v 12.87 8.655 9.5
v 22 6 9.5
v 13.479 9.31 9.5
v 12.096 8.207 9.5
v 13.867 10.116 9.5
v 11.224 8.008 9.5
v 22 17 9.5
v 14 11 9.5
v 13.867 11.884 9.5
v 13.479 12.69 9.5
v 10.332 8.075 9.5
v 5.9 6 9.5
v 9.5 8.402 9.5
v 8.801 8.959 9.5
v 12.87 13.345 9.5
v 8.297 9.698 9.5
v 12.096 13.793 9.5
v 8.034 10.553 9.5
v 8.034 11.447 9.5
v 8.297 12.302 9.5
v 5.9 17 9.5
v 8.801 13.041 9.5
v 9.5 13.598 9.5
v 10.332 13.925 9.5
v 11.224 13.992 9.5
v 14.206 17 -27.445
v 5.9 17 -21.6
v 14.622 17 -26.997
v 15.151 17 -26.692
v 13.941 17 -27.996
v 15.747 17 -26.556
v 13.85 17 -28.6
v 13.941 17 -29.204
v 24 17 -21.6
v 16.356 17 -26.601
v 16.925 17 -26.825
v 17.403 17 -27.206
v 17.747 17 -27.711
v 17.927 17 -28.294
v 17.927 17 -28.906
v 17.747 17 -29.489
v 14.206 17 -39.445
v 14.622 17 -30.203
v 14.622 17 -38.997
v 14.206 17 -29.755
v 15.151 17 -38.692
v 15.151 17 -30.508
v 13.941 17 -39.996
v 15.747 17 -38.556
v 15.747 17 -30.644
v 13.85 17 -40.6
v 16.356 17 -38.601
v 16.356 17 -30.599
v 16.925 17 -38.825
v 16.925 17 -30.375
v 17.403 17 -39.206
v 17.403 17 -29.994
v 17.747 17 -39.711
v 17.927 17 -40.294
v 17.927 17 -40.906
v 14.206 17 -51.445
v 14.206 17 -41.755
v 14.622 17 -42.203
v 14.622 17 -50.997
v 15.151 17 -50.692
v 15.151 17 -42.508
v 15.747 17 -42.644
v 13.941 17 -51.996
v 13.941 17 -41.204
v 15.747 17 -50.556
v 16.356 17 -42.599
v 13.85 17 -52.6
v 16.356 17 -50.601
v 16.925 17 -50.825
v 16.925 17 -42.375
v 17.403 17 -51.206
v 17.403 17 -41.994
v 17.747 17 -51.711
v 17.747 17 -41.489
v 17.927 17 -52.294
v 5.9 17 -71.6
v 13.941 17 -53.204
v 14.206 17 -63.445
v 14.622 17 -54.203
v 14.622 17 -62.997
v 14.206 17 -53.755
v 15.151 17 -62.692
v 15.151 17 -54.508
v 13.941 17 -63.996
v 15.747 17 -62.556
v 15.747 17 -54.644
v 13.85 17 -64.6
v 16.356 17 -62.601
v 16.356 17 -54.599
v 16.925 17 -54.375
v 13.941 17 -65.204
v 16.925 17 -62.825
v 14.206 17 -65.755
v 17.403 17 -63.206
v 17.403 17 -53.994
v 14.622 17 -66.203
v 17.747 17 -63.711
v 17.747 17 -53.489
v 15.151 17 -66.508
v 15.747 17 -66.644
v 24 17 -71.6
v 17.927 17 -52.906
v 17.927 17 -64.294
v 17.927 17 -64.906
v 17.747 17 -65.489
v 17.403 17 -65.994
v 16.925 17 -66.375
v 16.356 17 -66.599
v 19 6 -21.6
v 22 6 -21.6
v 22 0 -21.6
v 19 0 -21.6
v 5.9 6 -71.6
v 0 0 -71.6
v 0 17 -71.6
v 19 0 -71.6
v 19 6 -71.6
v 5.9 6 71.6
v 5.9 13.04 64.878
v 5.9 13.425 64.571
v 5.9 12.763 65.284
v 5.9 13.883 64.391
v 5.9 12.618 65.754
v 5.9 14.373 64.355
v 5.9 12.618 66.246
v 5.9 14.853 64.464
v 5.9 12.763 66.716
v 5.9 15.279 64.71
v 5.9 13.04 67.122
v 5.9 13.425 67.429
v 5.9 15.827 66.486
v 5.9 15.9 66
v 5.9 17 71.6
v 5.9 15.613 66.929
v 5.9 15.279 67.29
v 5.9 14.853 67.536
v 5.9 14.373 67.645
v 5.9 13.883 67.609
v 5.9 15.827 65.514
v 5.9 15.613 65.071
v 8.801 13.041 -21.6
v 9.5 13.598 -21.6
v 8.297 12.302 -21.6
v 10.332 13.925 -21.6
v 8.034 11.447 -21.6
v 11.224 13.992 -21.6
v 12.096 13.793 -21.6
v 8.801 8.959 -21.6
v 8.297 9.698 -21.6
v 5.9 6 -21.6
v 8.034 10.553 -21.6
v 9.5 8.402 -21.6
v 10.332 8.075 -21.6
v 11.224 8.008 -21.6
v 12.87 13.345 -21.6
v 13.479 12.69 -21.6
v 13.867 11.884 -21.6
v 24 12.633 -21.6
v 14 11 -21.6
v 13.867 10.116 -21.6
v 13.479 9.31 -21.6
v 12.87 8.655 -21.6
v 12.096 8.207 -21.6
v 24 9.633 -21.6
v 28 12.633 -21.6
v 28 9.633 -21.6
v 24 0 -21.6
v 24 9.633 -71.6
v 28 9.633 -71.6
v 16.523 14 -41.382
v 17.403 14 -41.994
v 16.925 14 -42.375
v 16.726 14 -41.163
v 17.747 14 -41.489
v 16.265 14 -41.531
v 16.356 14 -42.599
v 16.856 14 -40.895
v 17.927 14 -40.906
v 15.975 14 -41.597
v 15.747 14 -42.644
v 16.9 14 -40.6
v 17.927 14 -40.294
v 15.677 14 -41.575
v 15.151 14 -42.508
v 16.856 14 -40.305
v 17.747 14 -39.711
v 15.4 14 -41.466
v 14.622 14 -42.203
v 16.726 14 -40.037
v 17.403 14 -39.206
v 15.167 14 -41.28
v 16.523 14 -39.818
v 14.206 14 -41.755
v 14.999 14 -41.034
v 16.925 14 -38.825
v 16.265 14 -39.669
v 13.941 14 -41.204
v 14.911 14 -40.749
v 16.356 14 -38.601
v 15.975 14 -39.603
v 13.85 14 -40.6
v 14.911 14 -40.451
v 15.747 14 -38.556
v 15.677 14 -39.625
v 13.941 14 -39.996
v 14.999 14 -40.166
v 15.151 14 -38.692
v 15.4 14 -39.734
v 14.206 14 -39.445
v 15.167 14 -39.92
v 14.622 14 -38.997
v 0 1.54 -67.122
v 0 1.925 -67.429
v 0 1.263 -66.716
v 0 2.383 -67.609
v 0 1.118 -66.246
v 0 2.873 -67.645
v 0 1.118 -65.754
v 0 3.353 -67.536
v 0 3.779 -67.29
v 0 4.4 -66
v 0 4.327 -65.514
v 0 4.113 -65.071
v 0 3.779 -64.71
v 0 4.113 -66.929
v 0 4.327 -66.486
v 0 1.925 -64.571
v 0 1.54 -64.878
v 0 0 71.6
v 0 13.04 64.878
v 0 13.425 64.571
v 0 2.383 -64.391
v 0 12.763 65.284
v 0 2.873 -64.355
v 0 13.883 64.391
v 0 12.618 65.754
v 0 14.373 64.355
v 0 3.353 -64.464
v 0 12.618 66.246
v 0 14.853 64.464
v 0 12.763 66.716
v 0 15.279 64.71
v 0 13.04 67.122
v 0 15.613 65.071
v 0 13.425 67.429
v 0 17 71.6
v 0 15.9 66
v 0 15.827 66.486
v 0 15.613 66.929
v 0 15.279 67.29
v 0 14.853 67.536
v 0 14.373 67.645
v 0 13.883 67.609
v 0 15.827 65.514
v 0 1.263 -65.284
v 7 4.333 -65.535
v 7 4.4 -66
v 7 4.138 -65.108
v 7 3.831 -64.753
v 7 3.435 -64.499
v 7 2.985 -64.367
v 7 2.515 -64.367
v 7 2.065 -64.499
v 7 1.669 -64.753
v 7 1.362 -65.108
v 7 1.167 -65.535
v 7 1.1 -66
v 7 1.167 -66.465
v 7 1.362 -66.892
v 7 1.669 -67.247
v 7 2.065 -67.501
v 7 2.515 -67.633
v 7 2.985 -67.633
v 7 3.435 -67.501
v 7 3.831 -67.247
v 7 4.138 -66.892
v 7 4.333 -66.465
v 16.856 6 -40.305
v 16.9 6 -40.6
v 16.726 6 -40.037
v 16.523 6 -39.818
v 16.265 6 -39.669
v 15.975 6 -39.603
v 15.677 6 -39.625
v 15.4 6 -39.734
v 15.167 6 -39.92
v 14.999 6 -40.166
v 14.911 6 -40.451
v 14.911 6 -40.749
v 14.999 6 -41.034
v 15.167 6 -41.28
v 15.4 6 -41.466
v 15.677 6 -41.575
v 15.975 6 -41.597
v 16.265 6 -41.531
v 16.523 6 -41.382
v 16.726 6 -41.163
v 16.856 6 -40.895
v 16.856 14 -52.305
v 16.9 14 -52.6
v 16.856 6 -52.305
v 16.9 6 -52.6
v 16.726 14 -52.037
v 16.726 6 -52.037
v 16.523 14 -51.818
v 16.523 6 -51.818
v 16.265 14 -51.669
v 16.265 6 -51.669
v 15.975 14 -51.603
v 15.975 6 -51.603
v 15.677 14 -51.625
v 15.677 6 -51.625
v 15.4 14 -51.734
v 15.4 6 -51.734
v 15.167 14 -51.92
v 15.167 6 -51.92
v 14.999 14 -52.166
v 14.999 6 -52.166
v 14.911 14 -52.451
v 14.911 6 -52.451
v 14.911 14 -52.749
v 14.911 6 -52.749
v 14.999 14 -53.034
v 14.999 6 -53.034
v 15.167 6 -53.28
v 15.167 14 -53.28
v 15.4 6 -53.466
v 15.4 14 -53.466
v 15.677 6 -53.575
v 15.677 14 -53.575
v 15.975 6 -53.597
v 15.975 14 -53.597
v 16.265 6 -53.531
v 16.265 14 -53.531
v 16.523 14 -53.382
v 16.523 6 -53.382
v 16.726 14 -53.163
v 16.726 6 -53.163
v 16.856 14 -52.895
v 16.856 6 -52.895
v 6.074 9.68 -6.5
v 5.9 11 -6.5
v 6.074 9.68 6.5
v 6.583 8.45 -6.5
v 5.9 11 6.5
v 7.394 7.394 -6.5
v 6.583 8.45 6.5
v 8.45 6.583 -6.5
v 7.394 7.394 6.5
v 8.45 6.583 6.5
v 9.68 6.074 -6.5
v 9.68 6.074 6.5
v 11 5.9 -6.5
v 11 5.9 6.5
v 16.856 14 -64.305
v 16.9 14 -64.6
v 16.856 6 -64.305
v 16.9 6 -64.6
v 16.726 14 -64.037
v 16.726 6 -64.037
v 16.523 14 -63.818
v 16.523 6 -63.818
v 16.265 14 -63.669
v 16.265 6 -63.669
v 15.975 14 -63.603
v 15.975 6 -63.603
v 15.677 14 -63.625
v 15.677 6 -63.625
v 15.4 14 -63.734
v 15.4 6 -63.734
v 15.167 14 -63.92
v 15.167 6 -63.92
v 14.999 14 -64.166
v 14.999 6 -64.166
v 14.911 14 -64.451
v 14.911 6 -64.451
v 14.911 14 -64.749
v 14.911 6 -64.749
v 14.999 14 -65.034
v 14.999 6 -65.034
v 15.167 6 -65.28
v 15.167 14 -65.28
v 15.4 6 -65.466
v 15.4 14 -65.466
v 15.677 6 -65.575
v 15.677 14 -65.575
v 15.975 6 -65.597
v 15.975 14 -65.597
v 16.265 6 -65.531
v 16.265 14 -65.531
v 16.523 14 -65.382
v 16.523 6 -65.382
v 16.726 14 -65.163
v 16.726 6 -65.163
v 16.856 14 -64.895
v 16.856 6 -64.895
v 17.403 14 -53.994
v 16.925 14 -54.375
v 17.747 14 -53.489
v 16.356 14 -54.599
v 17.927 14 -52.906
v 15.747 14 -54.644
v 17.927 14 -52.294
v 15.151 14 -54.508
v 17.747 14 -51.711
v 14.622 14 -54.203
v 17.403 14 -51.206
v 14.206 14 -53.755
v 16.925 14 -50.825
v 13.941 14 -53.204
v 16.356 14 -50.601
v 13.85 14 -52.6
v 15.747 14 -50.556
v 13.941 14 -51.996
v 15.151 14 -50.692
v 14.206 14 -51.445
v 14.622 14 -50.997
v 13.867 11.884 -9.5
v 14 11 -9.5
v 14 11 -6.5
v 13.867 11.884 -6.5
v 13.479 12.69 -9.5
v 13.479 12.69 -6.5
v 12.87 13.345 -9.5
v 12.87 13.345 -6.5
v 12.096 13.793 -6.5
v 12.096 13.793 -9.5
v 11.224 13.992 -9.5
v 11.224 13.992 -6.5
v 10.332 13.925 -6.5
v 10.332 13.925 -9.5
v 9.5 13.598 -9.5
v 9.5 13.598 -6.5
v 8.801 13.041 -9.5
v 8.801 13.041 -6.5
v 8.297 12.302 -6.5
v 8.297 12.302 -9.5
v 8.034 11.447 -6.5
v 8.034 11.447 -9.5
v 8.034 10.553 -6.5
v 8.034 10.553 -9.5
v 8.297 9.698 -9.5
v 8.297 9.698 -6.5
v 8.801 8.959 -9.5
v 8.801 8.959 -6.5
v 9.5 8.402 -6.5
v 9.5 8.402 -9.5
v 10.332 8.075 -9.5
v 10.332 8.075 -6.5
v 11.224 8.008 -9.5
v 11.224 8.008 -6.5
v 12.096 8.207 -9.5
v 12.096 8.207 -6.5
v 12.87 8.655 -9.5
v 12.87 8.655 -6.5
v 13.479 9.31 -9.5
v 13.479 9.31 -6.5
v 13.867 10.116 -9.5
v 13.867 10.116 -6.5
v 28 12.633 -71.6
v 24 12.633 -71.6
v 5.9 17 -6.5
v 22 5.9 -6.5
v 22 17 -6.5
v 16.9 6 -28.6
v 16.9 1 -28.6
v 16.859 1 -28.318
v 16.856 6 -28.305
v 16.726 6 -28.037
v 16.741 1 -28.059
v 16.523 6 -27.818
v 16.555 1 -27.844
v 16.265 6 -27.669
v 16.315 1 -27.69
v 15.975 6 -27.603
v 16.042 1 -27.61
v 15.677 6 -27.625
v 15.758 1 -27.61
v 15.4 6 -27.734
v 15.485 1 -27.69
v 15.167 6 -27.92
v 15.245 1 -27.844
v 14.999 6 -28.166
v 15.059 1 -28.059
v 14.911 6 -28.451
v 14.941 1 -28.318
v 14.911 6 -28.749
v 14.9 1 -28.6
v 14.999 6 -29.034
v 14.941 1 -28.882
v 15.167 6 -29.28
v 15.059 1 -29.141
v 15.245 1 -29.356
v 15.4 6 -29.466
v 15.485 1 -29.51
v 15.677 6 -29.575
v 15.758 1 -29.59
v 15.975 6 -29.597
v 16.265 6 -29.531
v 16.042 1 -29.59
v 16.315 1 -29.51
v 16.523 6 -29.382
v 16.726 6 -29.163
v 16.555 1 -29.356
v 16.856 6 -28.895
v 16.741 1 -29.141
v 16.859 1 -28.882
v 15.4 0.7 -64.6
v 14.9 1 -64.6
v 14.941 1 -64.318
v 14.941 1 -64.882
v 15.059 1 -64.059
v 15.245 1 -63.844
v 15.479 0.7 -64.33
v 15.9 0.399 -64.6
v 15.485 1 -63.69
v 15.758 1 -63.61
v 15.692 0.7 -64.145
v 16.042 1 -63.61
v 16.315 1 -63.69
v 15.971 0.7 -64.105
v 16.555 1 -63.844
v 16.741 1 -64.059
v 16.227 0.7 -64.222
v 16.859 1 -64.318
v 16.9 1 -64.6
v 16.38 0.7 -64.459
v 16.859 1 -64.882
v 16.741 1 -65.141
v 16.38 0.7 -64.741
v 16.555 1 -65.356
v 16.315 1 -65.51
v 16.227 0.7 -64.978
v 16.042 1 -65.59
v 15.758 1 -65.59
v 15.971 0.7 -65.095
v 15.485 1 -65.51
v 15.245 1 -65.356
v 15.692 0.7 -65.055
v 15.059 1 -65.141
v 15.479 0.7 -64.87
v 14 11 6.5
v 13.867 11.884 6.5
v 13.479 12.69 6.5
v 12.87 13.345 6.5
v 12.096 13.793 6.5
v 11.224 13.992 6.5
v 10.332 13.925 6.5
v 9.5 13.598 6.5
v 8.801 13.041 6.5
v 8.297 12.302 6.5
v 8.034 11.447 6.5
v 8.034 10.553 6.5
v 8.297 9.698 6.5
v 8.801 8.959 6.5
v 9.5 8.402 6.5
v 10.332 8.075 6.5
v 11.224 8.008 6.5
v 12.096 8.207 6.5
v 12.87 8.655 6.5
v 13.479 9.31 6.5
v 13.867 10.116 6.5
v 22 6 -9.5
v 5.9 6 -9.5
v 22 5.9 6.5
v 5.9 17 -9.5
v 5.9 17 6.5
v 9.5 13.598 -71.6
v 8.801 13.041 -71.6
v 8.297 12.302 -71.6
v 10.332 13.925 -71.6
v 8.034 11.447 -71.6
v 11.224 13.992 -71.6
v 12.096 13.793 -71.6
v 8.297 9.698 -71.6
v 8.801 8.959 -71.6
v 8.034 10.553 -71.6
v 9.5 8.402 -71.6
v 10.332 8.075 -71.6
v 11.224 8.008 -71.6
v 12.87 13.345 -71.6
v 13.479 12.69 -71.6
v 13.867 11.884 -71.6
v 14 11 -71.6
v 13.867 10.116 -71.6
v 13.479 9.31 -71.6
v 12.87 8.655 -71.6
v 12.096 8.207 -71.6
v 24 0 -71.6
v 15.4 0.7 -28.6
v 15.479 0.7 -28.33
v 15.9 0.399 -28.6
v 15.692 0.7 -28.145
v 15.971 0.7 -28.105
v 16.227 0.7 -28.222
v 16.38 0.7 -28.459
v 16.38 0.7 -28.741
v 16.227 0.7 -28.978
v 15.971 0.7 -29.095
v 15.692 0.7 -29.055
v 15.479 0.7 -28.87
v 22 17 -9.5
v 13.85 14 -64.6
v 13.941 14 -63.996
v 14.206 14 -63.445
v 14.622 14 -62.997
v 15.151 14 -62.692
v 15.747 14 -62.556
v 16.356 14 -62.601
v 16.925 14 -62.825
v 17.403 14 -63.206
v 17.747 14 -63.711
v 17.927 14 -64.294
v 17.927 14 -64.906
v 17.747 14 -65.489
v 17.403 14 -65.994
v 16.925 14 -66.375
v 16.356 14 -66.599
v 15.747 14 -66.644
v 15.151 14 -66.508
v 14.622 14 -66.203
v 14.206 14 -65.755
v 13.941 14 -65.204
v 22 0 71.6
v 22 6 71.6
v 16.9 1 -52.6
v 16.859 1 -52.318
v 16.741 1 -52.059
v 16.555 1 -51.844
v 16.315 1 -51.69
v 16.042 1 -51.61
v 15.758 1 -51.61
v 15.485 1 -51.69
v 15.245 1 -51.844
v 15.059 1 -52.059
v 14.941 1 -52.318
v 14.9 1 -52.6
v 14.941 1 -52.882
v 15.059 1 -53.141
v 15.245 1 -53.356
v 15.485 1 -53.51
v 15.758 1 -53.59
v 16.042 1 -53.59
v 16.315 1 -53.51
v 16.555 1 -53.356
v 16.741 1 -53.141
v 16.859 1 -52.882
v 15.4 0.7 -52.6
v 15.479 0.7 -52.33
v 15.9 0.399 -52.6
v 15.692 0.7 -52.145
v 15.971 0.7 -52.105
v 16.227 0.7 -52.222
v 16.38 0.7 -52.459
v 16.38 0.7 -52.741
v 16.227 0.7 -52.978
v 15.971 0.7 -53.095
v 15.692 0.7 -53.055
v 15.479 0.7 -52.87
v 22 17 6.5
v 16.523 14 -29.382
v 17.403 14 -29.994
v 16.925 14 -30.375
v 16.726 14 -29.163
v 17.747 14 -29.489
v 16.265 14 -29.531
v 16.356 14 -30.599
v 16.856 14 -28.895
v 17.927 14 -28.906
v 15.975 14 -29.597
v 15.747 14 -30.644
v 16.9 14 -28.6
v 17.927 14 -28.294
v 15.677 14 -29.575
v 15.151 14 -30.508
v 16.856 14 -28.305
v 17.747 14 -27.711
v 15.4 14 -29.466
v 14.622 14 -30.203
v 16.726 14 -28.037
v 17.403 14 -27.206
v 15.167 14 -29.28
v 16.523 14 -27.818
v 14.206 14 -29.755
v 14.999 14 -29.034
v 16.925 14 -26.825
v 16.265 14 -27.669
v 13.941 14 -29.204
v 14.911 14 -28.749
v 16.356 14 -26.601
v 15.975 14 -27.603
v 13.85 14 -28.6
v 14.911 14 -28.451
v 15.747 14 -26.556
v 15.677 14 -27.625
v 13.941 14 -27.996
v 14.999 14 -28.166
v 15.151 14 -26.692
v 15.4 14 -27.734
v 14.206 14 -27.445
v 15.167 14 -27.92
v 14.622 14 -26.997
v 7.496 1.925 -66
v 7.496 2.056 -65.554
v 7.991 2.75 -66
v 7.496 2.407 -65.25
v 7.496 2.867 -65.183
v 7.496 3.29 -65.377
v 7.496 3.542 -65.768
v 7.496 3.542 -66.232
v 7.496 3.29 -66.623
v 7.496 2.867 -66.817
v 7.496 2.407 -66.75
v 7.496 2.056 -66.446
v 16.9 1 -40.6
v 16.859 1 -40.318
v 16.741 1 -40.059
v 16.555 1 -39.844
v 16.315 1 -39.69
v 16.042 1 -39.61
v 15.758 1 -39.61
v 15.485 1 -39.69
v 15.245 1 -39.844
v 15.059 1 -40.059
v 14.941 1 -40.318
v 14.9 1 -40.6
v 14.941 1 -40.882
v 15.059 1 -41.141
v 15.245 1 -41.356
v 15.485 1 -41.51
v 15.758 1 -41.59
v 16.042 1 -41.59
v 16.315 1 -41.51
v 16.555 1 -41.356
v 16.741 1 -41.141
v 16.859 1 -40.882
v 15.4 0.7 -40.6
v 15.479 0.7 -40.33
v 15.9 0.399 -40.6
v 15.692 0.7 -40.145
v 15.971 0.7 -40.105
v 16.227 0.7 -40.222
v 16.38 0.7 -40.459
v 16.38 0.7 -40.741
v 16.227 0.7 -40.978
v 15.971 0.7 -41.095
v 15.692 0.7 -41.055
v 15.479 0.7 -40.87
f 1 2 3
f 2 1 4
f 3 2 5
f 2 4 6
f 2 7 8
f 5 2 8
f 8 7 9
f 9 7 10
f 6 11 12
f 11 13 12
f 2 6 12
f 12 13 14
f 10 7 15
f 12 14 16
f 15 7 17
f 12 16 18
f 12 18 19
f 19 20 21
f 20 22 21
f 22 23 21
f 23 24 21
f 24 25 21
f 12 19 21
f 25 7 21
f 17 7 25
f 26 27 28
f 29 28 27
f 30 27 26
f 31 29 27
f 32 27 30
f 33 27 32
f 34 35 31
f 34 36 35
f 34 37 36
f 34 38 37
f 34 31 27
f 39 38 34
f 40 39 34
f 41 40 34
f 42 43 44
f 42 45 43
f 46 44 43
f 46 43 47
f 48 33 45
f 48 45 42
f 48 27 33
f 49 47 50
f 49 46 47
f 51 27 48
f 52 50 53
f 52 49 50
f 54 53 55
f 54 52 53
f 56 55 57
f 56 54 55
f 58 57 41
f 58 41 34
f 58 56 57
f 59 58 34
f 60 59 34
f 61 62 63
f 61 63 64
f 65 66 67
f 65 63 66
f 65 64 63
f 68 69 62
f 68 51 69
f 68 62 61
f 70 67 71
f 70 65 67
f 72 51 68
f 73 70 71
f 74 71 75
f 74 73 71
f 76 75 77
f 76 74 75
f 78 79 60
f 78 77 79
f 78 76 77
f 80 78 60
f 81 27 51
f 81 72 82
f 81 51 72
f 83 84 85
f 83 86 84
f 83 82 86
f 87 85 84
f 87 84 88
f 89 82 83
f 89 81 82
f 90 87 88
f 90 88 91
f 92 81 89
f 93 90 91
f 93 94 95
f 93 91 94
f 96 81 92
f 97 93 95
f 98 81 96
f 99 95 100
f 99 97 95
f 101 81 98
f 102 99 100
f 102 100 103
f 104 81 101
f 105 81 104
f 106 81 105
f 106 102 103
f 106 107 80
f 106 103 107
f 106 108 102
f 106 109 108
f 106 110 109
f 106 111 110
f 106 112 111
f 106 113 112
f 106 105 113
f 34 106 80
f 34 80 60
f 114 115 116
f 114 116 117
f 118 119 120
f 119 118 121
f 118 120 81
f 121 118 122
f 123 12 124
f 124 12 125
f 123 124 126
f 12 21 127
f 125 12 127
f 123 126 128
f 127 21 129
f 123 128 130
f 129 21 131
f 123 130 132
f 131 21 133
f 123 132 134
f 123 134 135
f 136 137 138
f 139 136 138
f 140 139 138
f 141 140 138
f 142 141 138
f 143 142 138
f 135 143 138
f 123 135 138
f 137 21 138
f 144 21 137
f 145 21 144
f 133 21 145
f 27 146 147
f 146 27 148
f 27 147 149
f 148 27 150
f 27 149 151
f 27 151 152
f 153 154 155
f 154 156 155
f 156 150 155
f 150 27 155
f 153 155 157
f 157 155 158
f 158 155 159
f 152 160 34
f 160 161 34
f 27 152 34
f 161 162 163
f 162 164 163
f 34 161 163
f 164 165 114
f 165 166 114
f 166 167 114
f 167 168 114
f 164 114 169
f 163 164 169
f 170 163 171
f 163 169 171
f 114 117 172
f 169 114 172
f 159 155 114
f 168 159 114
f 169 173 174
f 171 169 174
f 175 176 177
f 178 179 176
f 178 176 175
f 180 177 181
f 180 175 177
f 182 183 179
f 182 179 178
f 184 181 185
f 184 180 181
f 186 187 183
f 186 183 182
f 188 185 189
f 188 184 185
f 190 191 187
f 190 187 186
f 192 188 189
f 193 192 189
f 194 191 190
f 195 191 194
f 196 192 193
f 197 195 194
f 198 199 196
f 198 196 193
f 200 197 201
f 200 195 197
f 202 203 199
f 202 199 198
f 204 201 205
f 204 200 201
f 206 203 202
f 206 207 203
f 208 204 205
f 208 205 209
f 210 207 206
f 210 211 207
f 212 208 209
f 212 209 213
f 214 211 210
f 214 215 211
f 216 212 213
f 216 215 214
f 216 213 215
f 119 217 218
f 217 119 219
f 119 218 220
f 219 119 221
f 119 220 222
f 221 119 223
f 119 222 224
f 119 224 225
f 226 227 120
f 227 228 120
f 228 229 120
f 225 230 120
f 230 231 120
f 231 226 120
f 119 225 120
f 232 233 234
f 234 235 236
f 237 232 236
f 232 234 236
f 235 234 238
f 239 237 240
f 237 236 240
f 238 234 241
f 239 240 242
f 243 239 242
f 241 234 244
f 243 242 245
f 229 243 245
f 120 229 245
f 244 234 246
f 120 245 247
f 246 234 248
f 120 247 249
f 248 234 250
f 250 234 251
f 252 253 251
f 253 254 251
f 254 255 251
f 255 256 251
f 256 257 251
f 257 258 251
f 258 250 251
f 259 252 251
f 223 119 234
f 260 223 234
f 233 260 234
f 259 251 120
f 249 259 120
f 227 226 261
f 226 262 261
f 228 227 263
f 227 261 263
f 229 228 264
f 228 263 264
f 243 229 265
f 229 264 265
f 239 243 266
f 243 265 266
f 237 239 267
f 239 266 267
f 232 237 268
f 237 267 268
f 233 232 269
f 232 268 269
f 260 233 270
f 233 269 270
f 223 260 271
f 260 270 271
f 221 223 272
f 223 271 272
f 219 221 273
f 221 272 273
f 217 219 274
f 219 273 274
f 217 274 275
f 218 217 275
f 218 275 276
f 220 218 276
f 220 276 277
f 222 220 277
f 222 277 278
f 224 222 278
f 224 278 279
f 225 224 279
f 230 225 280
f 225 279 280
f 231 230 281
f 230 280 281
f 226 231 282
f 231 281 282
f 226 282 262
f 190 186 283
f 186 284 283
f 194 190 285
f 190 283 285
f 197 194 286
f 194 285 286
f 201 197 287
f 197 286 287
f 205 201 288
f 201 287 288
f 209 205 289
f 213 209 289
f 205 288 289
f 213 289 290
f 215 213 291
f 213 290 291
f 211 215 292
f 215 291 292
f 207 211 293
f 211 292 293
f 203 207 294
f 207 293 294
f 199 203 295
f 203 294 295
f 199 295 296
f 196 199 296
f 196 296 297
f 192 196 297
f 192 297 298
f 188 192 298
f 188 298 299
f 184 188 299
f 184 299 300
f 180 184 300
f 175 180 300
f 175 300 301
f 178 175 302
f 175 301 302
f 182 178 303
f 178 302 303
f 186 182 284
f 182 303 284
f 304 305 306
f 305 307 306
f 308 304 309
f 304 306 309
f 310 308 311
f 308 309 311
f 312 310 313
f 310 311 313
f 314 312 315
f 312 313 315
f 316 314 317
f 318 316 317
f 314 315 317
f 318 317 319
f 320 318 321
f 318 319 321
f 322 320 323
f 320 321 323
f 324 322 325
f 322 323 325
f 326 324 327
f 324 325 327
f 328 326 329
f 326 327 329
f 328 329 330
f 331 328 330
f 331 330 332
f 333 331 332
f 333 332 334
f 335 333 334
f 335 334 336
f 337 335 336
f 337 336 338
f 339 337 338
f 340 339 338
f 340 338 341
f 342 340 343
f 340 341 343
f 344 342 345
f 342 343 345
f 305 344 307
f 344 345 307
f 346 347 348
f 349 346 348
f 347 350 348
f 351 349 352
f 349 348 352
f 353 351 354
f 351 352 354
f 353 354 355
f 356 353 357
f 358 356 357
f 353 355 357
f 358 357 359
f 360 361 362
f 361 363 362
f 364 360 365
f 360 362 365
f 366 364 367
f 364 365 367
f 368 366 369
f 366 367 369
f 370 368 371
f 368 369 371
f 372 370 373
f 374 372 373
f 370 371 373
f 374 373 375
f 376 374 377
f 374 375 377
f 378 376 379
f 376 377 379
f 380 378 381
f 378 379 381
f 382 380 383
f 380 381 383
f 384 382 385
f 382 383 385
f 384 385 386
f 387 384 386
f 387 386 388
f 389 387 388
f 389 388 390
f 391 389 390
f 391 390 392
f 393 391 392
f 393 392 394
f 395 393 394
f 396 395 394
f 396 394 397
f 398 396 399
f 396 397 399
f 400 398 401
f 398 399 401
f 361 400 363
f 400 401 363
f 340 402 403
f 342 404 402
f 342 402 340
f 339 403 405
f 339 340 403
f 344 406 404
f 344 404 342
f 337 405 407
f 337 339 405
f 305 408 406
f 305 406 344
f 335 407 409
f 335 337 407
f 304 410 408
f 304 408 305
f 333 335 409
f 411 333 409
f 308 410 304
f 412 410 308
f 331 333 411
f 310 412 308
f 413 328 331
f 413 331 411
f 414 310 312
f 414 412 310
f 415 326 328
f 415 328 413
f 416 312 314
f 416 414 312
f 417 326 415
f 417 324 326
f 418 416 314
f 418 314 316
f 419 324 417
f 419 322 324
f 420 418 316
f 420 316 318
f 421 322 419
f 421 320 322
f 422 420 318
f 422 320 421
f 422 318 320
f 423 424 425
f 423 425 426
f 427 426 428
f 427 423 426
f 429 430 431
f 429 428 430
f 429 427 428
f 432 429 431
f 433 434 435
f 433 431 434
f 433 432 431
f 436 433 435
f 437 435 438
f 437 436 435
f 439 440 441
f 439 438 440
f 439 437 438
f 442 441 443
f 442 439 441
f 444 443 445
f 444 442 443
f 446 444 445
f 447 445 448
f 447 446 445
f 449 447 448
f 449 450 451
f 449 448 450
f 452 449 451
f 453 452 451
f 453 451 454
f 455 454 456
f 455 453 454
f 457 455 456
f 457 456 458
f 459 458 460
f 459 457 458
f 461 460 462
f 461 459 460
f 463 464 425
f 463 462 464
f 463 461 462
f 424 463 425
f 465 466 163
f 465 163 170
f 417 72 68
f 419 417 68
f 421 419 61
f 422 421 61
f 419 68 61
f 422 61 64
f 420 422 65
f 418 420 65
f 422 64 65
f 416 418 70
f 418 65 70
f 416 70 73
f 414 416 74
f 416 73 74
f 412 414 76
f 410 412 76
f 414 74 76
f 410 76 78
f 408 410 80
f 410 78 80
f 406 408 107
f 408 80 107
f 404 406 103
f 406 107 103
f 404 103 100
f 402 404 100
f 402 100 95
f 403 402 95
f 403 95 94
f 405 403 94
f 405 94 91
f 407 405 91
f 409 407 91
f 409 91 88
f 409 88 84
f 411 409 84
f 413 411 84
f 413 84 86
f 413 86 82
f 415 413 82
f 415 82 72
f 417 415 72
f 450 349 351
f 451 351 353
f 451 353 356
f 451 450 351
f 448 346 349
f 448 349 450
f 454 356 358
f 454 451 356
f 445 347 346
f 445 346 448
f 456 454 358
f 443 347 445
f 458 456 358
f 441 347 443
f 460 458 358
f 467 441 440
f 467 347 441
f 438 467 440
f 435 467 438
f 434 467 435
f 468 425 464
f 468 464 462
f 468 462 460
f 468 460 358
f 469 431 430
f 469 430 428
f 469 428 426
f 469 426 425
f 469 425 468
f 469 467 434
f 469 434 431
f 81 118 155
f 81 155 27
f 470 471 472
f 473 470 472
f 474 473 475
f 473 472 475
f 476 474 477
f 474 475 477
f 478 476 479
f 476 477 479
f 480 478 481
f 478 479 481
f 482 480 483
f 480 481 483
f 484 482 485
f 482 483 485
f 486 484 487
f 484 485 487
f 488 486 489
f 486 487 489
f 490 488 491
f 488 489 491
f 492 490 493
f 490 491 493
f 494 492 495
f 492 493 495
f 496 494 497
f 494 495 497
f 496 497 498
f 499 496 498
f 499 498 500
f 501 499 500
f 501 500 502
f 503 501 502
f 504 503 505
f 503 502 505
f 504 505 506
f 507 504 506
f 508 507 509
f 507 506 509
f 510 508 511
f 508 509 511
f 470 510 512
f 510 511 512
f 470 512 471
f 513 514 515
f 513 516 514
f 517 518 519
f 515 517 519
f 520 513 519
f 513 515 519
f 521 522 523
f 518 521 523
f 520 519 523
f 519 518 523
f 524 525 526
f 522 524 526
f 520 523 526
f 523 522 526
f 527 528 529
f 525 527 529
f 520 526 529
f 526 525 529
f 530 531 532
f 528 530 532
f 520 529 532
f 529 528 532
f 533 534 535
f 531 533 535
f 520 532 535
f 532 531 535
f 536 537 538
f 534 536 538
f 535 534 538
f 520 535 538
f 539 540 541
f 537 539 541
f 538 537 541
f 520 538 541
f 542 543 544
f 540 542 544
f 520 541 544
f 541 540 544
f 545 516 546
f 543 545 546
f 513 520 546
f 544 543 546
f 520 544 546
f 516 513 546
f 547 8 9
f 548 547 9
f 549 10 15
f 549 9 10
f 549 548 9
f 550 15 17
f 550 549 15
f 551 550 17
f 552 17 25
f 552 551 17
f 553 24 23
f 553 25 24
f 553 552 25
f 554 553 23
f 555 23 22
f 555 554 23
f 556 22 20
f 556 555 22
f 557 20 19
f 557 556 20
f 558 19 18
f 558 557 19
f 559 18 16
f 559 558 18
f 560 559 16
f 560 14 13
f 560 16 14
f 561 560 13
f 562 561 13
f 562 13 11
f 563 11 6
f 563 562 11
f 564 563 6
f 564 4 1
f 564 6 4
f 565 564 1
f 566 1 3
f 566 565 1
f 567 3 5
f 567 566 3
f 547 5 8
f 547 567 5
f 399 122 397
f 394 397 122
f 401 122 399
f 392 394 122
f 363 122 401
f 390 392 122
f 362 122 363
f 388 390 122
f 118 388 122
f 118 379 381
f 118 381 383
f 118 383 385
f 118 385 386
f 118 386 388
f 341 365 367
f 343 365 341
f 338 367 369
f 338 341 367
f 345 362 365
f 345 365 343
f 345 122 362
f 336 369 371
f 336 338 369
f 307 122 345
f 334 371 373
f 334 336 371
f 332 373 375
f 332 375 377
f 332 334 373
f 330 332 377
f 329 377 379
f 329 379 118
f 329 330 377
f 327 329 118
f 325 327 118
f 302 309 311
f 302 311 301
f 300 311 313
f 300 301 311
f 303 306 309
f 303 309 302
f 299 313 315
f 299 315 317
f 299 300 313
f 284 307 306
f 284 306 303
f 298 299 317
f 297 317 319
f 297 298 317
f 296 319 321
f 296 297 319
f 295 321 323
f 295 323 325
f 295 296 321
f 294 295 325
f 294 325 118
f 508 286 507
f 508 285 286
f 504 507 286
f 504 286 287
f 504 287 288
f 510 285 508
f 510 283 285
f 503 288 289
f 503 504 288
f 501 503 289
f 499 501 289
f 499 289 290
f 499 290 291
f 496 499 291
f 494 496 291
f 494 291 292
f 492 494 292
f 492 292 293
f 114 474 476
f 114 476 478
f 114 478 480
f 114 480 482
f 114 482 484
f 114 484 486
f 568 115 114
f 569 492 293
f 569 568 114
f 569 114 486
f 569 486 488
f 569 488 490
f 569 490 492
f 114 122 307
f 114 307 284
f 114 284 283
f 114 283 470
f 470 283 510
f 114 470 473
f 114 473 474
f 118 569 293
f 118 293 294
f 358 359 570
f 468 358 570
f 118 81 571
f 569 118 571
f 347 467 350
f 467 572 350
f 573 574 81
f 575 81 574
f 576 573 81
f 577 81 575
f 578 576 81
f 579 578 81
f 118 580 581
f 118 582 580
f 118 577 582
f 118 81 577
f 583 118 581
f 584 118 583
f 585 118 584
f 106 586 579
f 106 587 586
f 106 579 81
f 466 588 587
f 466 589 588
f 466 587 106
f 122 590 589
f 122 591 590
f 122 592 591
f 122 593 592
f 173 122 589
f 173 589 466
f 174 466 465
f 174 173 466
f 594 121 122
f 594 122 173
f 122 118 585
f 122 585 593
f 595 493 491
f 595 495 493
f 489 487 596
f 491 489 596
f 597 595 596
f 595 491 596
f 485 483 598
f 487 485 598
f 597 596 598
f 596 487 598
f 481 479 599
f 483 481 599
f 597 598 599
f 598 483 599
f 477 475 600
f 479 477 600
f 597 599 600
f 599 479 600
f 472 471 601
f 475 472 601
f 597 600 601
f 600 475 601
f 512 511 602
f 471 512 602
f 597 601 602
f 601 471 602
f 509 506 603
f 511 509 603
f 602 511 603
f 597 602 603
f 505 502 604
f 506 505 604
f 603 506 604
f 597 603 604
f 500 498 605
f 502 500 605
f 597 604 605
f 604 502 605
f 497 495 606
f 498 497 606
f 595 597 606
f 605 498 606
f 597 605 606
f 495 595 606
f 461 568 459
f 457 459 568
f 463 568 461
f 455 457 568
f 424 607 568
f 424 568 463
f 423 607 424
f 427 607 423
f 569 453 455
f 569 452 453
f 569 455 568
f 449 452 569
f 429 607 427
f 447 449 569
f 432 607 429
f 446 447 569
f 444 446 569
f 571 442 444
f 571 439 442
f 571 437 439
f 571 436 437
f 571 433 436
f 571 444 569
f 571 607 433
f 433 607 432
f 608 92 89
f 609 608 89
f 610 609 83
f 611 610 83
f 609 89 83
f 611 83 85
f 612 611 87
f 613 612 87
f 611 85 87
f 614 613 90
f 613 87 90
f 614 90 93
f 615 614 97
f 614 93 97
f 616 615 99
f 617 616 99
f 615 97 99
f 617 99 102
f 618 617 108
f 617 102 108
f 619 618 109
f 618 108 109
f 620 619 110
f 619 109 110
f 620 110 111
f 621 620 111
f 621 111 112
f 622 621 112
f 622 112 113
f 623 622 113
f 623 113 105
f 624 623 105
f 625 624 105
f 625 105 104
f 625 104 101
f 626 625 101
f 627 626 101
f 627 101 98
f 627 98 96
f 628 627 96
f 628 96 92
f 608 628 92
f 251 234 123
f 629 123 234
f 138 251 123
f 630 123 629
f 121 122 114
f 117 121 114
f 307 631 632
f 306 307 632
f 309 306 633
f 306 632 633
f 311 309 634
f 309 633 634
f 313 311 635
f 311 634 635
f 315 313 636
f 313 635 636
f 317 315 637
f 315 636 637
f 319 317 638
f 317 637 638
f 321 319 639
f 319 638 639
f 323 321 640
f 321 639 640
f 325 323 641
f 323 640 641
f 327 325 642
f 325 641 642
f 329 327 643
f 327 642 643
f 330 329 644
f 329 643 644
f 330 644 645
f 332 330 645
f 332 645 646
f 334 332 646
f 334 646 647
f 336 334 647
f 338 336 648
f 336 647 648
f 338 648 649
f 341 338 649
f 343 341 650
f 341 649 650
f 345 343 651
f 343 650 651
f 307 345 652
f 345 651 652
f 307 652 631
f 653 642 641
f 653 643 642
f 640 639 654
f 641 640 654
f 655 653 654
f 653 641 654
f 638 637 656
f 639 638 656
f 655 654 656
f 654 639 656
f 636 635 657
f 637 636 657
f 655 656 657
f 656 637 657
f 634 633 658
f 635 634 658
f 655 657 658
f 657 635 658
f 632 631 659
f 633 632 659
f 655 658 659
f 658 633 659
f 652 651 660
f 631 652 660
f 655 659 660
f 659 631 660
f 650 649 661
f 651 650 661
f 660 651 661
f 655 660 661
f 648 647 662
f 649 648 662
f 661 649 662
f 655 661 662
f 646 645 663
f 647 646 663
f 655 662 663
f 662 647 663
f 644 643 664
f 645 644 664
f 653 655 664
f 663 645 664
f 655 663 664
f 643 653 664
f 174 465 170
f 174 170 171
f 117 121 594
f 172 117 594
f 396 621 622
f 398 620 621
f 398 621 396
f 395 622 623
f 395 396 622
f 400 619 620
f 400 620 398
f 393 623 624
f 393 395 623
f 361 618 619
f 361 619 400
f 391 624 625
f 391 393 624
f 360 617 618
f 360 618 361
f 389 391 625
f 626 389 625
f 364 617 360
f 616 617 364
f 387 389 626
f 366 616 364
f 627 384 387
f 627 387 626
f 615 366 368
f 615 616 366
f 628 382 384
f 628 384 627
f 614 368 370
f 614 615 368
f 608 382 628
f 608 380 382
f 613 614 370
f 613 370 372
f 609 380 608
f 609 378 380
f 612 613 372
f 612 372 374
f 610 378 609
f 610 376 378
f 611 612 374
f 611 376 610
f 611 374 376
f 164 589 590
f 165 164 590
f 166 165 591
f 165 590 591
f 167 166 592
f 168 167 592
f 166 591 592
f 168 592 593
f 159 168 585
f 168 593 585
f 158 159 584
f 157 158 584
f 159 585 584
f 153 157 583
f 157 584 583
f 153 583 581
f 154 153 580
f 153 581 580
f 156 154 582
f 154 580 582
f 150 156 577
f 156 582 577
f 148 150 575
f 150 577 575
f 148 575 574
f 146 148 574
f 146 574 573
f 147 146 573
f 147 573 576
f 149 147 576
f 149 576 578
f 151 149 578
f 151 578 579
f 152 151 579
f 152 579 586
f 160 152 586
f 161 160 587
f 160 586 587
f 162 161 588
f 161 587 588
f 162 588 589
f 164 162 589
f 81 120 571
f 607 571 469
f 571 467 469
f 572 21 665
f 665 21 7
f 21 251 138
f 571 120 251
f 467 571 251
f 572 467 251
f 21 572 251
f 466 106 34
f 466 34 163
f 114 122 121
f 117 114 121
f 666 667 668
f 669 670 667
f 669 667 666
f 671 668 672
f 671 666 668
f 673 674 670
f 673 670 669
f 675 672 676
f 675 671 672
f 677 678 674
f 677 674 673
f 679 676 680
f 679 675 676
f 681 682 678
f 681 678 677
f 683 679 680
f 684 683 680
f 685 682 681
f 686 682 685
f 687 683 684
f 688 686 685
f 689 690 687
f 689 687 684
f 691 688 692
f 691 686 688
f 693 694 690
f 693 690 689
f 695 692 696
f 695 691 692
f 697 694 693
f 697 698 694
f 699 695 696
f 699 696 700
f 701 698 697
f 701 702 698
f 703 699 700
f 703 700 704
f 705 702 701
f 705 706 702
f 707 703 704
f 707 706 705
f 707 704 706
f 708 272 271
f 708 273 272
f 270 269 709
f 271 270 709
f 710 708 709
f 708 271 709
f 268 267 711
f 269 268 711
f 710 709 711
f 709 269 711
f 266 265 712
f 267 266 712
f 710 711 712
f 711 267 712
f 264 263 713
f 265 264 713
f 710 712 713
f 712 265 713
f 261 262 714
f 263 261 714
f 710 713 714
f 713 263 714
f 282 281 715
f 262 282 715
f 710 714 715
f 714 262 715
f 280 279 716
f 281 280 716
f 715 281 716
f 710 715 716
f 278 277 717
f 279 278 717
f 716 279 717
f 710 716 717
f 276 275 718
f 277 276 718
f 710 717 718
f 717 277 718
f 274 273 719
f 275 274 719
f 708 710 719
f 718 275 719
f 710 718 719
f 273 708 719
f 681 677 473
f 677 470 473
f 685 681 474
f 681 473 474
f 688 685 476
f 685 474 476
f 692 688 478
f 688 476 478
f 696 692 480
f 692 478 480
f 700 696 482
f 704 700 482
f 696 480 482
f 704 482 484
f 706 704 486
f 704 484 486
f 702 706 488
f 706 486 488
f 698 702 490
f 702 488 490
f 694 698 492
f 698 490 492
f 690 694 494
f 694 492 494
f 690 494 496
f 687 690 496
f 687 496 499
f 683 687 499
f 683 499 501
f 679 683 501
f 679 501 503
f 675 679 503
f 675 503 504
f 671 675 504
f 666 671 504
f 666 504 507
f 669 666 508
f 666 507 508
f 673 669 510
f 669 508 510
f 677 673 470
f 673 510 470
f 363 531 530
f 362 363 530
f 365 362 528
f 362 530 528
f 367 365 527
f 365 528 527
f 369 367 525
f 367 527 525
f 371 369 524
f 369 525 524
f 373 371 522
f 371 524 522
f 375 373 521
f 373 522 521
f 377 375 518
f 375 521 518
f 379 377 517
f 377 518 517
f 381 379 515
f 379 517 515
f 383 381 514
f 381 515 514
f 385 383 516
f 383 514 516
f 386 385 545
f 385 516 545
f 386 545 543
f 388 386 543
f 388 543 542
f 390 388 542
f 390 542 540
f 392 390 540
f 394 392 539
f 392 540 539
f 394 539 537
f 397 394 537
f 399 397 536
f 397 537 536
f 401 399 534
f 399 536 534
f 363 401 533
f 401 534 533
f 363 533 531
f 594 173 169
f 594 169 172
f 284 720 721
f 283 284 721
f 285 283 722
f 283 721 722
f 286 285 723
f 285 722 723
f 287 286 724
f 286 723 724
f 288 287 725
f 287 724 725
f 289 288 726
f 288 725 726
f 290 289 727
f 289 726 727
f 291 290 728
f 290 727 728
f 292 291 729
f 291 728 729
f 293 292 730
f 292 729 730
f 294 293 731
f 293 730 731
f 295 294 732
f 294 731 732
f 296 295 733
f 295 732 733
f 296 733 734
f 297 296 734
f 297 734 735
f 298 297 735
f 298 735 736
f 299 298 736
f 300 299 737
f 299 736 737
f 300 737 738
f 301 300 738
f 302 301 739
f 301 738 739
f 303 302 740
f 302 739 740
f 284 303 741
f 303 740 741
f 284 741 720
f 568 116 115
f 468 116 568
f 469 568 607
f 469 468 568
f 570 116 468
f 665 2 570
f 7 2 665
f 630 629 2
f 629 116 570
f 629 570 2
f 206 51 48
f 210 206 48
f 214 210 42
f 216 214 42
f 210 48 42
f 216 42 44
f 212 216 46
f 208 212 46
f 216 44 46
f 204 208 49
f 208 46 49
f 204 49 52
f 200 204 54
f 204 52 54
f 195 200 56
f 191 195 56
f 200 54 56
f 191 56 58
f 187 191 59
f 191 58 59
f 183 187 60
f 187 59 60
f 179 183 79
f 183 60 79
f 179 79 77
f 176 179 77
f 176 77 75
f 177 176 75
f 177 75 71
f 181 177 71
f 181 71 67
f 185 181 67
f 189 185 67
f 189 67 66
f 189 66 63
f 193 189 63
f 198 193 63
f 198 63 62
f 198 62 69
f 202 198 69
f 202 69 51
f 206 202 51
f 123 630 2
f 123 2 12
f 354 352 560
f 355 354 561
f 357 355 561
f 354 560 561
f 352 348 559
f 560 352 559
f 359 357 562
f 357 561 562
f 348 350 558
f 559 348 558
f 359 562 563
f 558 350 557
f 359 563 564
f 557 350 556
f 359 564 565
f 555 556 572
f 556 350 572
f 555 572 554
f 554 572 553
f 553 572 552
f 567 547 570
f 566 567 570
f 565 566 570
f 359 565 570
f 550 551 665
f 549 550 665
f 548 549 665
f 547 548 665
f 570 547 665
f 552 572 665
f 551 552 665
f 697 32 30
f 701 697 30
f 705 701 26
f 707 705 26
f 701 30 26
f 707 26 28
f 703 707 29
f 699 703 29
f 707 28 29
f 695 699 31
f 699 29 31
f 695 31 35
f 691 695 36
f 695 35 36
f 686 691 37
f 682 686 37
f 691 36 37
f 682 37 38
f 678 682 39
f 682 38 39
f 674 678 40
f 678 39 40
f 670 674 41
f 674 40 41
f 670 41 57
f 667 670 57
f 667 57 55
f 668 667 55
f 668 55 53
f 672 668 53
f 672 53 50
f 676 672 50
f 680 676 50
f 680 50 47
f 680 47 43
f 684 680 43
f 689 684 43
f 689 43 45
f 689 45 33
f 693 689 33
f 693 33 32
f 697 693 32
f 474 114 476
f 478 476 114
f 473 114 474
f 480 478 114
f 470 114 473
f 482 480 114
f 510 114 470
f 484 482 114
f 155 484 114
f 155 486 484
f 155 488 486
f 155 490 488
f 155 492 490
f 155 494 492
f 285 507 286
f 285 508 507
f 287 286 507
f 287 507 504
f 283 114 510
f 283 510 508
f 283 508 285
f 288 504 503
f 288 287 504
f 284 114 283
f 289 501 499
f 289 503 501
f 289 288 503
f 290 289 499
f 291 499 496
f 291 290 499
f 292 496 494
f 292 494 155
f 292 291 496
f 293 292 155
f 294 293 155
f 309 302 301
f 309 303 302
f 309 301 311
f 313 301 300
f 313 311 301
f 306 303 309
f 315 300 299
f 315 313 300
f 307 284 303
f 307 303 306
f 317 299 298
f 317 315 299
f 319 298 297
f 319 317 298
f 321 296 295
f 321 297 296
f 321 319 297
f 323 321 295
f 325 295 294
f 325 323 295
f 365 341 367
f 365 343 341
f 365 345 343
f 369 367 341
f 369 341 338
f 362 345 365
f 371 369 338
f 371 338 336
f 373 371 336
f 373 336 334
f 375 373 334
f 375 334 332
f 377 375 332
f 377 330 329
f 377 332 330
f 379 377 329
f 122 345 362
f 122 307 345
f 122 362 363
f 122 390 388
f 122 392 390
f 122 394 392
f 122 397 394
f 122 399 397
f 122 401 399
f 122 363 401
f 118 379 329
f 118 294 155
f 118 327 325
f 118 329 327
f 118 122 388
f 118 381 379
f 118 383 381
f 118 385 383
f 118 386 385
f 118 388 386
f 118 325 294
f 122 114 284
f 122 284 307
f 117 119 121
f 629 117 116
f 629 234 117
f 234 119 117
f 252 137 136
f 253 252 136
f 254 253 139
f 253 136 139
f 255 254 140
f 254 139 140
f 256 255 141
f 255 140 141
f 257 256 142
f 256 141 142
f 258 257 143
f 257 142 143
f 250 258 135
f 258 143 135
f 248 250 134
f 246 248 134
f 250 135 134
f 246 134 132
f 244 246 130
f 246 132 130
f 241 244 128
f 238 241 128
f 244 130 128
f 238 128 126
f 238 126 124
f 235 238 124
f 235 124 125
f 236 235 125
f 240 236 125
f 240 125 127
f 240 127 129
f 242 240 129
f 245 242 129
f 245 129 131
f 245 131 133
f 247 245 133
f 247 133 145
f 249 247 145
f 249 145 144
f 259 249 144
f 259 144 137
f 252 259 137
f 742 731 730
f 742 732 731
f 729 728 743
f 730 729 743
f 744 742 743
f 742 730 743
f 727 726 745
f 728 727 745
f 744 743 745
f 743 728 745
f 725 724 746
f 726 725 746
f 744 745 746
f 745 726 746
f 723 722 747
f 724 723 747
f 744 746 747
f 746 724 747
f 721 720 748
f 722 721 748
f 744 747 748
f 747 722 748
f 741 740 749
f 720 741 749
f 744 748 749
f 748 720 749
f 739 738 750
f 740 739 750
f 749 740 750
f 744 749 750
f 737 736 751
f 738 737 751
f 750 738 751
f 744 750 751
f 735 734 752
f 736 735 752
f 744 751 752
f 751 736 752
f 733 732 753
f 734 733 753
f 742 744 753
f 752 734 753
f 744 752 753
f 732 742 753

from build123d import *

# Parameters (mm, degrees)
F0_W              = 22
F0_H              = 17
F0_R              = 3
F1_DEPTH          = 71.6
F3_DEPTH          = 6.5
F4_W              = 16.1
F4_H              = 62.1
F5_DEPTH          = 11
F6_W              = 3
F6_H              = 50
F7_DEPTH          = 25
F9_D              = 3.3
F9_DEPTH          = 7
F9_TIP            = 0.9914200214
F10_R             = 3
F10_W             = 5
F10_H             = 6
F10_W_2           = 4
F10_H_2           = 3
F11_DEPTH         = 50
F13_D             = 2
F13_DEPTH         = 16
F13_CBORE_D       = 4.1
F13_CBORE_DEPTH   = 3
F13_TIP           = 0.600860619
F13_2_D           = 2
F13_2_DEPTH       = 16
F13_2_CBORE_D     = 4.1
F13_2_CBORE_DEPTH = 3
F13_2_TIP         = 0.600860619


with BuildPart() as f1:
    # F0 (on Top) → F1 (new body, symmetric)
    with BuildSketch(Plane.XY):
        with Locations((11, 8.5)):
            Rectangle(F0_W, F0_H)
        with Locations((11, 11)):
            Circle(F0_R, mode=Mode.SUBTRACT)
    extrude(amount=F1_DEPTH, both=True)

    # F2 (on Top) → F3 (cut, symmetric)
    with BuildSketch(Plane.XY):
        with BuildLine():
            ThreePointArc((11, 5.9), (14.6062445841, 7.3937554159), (16.1, 11))
            ThreePointArc((16.1, 11), (11, 16.1), (5.9, 11))
            ThreePointArc((5.9, 11), (7.3937554159, 7.3937554159), (11, 5.9))
        make_face()
        with BuildLine():
            ThreePointArc((5.9, 11), (11, 16.1), (16.1, 11))
            ThreePointArc((16.1, 11), (14.6062445841, 7.3937554159), (11, 5.9))
            Line((11, 5.9), (22, 5.9))
            Line((22, 5.9), (22, 17))
            Line((22, 17), (5.9, 17))
            Line((5.9, 17), (5.9, 11))
        make_face()
    extrude(amount=F3_DEPTH, both=True, mode=Mode.SUBTRACT)

    # F4 (on face) → F5 (cut)
    with BuildSketch(Plane(origin=(0, 17, 0), x_dir=(-1, 0, 0), z_dir=(0, 1, 0))):
        with Locations((-13.95, -40.55)):
            Rectangle(F4_W, F4_H)
        with Locations((-13.95, 40.55)):
            Rectangle(F4_W, F4_H)
    extrude(amount=-F5_DEPTH, mode=Mode.SUBTRACT)

    # F6 (on face) → F7 (cut)
    with BuildSketch(Plane(origin=(0, 6, 0), x_dir=(-1, 0, 0), z_dir=(0, 1, 0))):
        with Locations((-20.5, -46.6)):
            Rectangle(F6_W, F6_H)
    extrude(amount=-F7_DEPTH, mode=Mode.SUBTRACT)

    # F9
    with Locations(Plane(origin=(0, 0, 0), x_dir=(0, -1, 0), z_dir=(-1, 0, 0))):
        with Locations((-2.75, -66), (-14.25, 66)):
            Hole(F9_D / 2, depth=F9_DEPTH)
            with Locations((0, 0, -(F9_DEPTH + F9_TIP / 2))):  # 118° drill point
                Cone(0, F9_D / 2, F9_TIP, mode=Mode.SUBTRACT)

    # F13
    with Locations(Plane(origin=(0, 17, 0), x_dir=(-1, 0, 0), z_dir=(0, 1, 0))):
        with Locations((-15.9, -64.6), (-15.9, -52.6), (-15.9, -40.6), (-15.9, -28.6)):
            CounterBoreHole(F13_D / 2, F13_CBORE_D / 2, F13_CBORE_DEPTH, depth=F13_DEPTH)
            with Locations((0, 0, -(F13_DEPTH + F13_TIP / 2))):  # 118° drill point
                Cone(0, F13_D / 2, F13_TIP, mode=Mode.SUBTRACT)


with BuildPart() as f11:
    # F10 (on face) → F11 (new body)
    with BuildSketch(Plane(origin=(0, 0, -71.6), x_dir=(1, 0, 0), z_dir=(0, 0, -1))):
        Polygon((19, -6), (5.9, -6), (5.9, -17), (24, -17), (24, -12.6333478838), (24, -9.6333478838), (24, -6), align=None)
        with Locations((11, -11)):
            Circle(F10_R, mode=Mode.SUBTRACT)
        with Locations((21.5, -3)):
            Rectangle(F10_W, F10_H)
        with Locations((26, -11.1333478838)):
            Rectangle(F10_W_2, F10_H_2)
    extrude(amount=-F11_DEPTH)

    # F13#2
    with Locations(Plane(origin=(0, 17, 0), x_dir=(-1, 0, 0), z_dir=(0, 1, 0))):
        with Locations((-15.9, -64.6), (-15.9, -52.6), (-15.9, -40.6), (-15.9, -28.6)):
            CounterBoreHole(F13_2_D / 2, F13_2_CBORE_D / 2, F13_2_CBORE_DEPTH, depth=F13_2_DEPTH)
            with Locations((0, 0, -(F13_2_DEPTH + F13_2_TIP / 2))):  # 118° drill point
                Cone(0, F13_2_D / 2, F13_2_TIP, mode=Mode.SUBTRACT)


solid = Compound([f1.part, f11.part])
